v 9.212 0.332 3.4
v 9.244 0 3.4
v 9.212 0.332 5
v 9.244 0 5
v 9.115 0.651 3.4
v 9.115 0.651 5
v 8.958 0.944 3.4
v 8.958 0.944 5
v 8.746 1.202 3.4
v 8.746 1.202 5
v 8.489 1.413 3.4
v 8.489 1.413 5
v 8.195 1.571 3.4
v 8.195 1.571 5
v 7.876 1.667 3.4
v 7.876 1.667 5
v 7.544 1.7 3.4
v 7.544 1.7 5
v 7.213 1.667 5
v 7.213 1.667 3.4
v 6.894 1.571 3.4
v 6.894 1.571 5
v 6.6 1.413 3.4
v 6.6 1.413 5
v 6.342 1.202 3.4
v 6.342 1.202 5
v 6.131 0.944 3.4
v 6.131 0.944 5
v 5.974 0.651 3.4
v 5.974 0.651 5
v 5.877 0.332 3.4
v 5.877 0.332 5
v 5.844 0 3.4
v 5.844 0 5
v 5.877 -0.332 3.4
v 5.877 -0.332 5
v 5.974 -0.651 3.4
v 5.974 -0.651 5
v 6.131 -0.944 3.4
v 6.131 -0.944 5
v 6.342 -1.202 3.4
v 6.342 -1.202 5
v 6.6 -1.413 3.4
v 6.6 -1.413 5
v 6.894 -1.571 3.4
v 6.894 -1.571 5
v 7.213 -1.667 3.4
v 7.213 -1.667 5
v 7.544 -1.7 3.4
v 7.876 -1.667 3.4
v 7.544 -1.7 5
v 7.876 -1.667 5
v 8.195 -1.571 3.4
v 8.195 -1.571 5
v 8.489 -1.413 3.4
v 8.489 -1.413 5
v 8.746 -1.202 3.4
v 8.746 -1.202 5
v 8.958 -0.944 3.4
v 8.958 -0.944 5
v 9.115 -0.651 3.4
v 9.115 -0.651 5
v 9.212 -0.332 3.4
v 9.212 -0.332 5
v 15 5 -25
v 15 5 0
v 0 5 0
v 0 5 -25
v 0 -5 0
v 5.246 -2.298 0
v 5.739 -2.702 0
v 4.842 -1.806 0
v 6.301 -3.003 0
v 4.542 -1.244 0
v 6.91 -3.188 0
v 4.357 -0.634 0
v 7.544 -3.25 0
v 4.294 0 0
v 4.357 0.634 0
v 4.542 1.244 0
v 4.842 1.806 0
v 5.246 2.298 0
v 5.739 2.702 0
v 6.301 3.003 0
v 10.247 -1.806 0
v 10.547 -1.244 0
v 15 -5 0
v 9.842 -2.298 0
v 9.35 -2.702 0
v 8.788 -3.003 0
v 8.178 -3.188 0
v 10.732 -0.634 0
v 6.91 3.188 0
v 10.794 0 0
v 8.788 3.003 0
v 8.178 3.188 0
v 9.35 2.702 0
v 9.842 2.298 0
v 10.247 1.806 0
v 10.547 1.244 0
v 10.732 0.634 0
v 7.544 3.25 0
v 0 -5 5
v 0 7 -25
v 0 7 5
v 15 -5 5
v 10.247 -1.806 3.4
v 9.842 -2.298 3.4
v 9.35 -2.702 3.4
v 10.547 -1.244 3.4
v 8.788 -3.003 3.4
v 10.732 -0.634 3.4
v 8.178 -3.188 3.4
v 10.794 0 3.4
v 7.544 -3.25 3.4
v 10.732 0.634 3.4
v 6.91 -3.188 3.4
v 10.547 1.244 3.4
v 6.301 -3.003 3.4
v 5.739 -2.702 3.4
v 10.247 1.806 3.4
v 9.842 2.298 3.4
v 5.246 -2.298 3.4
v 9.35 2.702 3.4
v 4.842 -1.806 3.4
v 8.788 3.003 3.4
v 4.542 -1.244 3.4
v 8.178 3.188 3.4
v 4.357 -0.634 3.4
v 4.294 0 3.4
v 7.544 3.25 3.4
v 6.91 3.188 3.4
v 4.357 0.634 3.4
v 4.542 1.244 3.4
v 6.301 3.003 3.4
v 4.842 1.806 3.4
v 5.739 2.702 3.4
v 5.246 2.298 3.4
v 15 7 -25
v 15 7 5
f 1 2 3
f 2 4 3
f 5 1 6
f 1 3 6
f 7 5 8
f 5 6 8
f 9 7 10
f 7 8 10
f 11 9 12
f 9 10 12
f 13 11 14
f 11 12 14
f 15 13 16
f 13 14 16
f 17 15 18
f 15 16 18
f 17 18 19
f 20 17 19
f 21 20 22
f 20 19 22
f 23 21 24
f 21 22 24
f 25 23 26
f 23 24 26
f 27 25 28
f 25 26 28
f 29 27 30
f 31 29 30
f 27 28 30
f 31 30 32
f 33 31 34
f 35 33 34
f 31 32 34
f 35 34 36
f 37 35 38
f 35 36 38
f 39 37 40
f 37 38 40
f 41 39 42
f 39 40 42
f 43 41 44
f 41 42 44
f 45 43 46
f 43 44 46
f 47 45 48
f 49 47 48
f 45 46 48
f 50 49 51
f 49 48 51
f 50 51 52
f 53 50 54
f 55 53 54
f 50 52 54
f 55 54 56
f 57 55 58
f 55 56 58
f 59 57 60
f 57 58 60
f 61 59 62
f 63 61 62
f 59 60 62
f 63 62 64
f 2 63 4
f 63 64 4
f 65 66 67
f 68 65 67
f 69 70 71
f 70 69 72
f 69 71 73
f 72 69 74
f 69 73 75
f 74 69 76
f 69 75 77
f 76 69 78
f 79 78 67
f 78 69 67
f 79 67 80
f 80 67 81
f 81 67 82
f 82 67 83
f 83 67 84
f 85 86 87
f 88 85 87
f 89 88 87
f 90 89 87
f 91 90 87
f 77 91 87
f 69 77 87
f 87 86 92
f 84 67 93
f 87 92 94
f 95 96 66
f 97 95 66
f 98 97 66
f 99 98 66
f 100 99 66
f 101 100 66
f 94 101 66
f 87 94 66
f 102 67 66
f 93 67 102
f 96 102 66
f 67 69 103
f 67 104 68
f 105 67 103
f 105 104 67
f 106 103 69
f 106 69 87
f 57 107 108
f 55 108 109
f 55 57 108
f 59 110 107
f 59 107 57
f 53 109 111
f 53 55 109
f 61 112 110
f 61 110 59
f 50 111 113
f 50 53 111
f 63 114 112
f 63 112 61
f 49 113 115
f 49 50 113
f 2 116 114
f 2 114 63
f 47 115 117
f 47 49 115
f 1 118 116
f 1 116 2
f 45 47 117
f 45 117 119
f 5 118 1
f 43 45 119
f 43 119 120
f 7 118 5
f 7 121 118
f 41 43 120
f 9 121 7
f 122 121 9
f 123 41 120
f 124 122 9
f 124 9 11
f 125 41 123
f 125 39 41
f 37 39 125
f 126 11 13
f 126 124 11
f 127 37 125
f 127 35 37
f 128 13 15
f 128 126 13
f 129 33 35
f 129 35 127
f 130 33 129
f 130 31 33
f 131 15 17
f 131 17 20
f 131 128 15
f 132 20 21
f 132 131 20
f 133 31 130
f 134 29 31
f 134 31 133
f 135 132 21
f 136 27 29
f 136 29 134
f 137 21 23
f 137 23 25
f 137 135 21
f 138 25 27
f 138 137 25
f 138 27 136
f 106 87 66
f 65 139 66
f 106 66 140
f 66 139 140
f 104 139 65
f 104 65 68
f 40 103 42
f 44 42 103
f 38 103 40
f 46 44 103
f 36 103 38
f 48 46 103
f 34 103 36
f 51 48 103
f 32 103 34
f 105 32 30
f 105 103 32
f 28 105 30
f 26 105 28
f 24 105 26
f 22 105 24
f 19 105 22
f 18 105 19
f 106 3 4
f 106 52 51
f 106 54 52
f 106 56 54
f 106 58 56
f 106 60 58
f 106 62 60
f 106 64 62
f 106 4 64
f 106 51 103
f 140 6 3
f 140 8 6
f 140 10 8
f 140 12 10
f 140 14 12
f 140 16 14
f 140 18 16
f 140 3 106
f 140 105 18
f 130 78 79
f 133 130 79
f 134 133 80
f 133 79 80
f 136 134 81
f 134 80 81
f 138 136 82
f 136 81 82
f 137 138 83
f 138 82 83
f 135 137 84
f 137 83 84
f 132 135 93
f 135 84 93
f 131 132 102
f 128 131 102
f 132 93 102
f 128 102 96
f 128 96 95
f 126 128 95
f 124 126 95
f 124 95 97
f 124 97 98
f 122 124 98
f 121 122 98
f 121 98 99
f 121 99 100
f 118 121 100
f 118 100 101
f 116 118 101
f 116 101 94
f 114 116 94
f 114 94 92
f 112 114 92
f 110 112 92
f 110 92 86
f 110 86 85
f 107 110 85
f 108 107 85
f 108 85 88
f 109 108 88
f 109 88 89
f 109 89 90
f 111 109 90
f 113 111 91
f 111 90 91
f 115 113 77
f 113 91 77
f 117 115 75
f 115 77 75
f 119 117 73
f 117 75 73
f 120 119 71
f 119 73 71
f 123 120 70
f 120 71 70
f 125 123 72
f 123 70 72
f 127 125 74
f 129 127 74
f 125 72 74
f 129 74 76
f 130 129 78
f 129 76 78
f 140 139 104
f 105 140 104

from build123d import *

# Parameters (mm, degrees)
SKETCH_1_W                   = 15
SKETCH_1_H                   = 12
EXTRUDE_1_DEPTH              = 5
SKETCH_2_W                   = 15
SKETCH_2_H                   = 2
EXTRUDE_2_DEPTH              = 25
SKETCH_6_W                   = 15
SKETCH_6_H                   = 5
CUT_EXTRUDE_2_DEPTH          = 6
SKETCH_7_W                   = 15
SKETCH_7_H                   = 5
EXTRUDE_3_DEPTH              = 5
HOLE_WIZARD_M3_1_D           = 3.4
HOLE_WIZARD_M3_1_DEPTH       = 7.5
HOLE_WIZARD_M3_1_CBORE_D     = 6.5
HOLE_WIZARD_M3_1_CBORE_DEPTH = 3.4
HOLE_WIZARD_M3_1_TIP         = 1.021463052


with BuildPart() as part:
    # 草图1 → 凸台-拉伸1 (new body)
    with BuildSketch(Plane.XY):
        with Locations((7.5, 6)):
            Rectangle(SKETCH_1_W, SKETCH_1_H)
    extrude(amount=EXTRUDE_1_DEPTH)

    # 草图2 → 凸台-拉伸2 (add)
    with BuildSketch(Plane(origin=(0, 0, 0), x_dir=(-1, 0, 0), z_dir=(0, 0, -1))):
        with Locations((-7.5, 6)):
            Rectangle(SKETCH_2_W, SKETCH_2_H)
    extrude(amount=EXTRUDE_2_DEPTH)

    # 草图6 → 切除-拉伸2 (cut, through all)
    with BuildSketch(Plane(origin=(0, 0, 0), x_dir=(-1, 0, 0), z_dir=(0, 0, -1))):
        with Locations((-7.5, 9.5)):
            Rectangle(SKETCH_6_W, SKETCH_6_H)
    extrude(amount=-CUT_EXTRUDE_2_DEPTH, mode=Mode.SUBTRACT)

    # 草图7 → 凸台-拉伸3 (add)
    with BuildSketch(Plane.XZ):
        with Locations((7.5, 2.5)):
            Rectangle(SKETCH_7_W, SKETCH_7_H)
    extrude(amount=EXTRUDE_3_DEPTH)

    # M3 六角凹头螺钉的柱形沉头孔1
    with Locations(Plane(origin=(0, 0, 0), x_dir=(-1, 0, 0), z_dir=(0, 0, -1))):
        with Locations((-7.544327116, 0)):
            CounterBoreHole(HOLE_WIZARD_M3_1_D / 2, HOLE_WIZARD_M3_1_CBORE_D / 2, HOLE_WIZARD_M3_1_CBORE_DEPTH, depth=HOLE_WIZARD_M3_1_DEPTH)
            with Locations((0, 0, -(HOLE_WIZARD_M3_1_DEPTH + HOLE_WIZARD_M3_1_TIP / 2))):  # 118° drill point
                Cone(0, HOLE_WIZARD_M3_1_D / 2, HOLE_WIZARD_M3_1_TIP, mode=Mode.SUBTRACT)


solid = part.part
